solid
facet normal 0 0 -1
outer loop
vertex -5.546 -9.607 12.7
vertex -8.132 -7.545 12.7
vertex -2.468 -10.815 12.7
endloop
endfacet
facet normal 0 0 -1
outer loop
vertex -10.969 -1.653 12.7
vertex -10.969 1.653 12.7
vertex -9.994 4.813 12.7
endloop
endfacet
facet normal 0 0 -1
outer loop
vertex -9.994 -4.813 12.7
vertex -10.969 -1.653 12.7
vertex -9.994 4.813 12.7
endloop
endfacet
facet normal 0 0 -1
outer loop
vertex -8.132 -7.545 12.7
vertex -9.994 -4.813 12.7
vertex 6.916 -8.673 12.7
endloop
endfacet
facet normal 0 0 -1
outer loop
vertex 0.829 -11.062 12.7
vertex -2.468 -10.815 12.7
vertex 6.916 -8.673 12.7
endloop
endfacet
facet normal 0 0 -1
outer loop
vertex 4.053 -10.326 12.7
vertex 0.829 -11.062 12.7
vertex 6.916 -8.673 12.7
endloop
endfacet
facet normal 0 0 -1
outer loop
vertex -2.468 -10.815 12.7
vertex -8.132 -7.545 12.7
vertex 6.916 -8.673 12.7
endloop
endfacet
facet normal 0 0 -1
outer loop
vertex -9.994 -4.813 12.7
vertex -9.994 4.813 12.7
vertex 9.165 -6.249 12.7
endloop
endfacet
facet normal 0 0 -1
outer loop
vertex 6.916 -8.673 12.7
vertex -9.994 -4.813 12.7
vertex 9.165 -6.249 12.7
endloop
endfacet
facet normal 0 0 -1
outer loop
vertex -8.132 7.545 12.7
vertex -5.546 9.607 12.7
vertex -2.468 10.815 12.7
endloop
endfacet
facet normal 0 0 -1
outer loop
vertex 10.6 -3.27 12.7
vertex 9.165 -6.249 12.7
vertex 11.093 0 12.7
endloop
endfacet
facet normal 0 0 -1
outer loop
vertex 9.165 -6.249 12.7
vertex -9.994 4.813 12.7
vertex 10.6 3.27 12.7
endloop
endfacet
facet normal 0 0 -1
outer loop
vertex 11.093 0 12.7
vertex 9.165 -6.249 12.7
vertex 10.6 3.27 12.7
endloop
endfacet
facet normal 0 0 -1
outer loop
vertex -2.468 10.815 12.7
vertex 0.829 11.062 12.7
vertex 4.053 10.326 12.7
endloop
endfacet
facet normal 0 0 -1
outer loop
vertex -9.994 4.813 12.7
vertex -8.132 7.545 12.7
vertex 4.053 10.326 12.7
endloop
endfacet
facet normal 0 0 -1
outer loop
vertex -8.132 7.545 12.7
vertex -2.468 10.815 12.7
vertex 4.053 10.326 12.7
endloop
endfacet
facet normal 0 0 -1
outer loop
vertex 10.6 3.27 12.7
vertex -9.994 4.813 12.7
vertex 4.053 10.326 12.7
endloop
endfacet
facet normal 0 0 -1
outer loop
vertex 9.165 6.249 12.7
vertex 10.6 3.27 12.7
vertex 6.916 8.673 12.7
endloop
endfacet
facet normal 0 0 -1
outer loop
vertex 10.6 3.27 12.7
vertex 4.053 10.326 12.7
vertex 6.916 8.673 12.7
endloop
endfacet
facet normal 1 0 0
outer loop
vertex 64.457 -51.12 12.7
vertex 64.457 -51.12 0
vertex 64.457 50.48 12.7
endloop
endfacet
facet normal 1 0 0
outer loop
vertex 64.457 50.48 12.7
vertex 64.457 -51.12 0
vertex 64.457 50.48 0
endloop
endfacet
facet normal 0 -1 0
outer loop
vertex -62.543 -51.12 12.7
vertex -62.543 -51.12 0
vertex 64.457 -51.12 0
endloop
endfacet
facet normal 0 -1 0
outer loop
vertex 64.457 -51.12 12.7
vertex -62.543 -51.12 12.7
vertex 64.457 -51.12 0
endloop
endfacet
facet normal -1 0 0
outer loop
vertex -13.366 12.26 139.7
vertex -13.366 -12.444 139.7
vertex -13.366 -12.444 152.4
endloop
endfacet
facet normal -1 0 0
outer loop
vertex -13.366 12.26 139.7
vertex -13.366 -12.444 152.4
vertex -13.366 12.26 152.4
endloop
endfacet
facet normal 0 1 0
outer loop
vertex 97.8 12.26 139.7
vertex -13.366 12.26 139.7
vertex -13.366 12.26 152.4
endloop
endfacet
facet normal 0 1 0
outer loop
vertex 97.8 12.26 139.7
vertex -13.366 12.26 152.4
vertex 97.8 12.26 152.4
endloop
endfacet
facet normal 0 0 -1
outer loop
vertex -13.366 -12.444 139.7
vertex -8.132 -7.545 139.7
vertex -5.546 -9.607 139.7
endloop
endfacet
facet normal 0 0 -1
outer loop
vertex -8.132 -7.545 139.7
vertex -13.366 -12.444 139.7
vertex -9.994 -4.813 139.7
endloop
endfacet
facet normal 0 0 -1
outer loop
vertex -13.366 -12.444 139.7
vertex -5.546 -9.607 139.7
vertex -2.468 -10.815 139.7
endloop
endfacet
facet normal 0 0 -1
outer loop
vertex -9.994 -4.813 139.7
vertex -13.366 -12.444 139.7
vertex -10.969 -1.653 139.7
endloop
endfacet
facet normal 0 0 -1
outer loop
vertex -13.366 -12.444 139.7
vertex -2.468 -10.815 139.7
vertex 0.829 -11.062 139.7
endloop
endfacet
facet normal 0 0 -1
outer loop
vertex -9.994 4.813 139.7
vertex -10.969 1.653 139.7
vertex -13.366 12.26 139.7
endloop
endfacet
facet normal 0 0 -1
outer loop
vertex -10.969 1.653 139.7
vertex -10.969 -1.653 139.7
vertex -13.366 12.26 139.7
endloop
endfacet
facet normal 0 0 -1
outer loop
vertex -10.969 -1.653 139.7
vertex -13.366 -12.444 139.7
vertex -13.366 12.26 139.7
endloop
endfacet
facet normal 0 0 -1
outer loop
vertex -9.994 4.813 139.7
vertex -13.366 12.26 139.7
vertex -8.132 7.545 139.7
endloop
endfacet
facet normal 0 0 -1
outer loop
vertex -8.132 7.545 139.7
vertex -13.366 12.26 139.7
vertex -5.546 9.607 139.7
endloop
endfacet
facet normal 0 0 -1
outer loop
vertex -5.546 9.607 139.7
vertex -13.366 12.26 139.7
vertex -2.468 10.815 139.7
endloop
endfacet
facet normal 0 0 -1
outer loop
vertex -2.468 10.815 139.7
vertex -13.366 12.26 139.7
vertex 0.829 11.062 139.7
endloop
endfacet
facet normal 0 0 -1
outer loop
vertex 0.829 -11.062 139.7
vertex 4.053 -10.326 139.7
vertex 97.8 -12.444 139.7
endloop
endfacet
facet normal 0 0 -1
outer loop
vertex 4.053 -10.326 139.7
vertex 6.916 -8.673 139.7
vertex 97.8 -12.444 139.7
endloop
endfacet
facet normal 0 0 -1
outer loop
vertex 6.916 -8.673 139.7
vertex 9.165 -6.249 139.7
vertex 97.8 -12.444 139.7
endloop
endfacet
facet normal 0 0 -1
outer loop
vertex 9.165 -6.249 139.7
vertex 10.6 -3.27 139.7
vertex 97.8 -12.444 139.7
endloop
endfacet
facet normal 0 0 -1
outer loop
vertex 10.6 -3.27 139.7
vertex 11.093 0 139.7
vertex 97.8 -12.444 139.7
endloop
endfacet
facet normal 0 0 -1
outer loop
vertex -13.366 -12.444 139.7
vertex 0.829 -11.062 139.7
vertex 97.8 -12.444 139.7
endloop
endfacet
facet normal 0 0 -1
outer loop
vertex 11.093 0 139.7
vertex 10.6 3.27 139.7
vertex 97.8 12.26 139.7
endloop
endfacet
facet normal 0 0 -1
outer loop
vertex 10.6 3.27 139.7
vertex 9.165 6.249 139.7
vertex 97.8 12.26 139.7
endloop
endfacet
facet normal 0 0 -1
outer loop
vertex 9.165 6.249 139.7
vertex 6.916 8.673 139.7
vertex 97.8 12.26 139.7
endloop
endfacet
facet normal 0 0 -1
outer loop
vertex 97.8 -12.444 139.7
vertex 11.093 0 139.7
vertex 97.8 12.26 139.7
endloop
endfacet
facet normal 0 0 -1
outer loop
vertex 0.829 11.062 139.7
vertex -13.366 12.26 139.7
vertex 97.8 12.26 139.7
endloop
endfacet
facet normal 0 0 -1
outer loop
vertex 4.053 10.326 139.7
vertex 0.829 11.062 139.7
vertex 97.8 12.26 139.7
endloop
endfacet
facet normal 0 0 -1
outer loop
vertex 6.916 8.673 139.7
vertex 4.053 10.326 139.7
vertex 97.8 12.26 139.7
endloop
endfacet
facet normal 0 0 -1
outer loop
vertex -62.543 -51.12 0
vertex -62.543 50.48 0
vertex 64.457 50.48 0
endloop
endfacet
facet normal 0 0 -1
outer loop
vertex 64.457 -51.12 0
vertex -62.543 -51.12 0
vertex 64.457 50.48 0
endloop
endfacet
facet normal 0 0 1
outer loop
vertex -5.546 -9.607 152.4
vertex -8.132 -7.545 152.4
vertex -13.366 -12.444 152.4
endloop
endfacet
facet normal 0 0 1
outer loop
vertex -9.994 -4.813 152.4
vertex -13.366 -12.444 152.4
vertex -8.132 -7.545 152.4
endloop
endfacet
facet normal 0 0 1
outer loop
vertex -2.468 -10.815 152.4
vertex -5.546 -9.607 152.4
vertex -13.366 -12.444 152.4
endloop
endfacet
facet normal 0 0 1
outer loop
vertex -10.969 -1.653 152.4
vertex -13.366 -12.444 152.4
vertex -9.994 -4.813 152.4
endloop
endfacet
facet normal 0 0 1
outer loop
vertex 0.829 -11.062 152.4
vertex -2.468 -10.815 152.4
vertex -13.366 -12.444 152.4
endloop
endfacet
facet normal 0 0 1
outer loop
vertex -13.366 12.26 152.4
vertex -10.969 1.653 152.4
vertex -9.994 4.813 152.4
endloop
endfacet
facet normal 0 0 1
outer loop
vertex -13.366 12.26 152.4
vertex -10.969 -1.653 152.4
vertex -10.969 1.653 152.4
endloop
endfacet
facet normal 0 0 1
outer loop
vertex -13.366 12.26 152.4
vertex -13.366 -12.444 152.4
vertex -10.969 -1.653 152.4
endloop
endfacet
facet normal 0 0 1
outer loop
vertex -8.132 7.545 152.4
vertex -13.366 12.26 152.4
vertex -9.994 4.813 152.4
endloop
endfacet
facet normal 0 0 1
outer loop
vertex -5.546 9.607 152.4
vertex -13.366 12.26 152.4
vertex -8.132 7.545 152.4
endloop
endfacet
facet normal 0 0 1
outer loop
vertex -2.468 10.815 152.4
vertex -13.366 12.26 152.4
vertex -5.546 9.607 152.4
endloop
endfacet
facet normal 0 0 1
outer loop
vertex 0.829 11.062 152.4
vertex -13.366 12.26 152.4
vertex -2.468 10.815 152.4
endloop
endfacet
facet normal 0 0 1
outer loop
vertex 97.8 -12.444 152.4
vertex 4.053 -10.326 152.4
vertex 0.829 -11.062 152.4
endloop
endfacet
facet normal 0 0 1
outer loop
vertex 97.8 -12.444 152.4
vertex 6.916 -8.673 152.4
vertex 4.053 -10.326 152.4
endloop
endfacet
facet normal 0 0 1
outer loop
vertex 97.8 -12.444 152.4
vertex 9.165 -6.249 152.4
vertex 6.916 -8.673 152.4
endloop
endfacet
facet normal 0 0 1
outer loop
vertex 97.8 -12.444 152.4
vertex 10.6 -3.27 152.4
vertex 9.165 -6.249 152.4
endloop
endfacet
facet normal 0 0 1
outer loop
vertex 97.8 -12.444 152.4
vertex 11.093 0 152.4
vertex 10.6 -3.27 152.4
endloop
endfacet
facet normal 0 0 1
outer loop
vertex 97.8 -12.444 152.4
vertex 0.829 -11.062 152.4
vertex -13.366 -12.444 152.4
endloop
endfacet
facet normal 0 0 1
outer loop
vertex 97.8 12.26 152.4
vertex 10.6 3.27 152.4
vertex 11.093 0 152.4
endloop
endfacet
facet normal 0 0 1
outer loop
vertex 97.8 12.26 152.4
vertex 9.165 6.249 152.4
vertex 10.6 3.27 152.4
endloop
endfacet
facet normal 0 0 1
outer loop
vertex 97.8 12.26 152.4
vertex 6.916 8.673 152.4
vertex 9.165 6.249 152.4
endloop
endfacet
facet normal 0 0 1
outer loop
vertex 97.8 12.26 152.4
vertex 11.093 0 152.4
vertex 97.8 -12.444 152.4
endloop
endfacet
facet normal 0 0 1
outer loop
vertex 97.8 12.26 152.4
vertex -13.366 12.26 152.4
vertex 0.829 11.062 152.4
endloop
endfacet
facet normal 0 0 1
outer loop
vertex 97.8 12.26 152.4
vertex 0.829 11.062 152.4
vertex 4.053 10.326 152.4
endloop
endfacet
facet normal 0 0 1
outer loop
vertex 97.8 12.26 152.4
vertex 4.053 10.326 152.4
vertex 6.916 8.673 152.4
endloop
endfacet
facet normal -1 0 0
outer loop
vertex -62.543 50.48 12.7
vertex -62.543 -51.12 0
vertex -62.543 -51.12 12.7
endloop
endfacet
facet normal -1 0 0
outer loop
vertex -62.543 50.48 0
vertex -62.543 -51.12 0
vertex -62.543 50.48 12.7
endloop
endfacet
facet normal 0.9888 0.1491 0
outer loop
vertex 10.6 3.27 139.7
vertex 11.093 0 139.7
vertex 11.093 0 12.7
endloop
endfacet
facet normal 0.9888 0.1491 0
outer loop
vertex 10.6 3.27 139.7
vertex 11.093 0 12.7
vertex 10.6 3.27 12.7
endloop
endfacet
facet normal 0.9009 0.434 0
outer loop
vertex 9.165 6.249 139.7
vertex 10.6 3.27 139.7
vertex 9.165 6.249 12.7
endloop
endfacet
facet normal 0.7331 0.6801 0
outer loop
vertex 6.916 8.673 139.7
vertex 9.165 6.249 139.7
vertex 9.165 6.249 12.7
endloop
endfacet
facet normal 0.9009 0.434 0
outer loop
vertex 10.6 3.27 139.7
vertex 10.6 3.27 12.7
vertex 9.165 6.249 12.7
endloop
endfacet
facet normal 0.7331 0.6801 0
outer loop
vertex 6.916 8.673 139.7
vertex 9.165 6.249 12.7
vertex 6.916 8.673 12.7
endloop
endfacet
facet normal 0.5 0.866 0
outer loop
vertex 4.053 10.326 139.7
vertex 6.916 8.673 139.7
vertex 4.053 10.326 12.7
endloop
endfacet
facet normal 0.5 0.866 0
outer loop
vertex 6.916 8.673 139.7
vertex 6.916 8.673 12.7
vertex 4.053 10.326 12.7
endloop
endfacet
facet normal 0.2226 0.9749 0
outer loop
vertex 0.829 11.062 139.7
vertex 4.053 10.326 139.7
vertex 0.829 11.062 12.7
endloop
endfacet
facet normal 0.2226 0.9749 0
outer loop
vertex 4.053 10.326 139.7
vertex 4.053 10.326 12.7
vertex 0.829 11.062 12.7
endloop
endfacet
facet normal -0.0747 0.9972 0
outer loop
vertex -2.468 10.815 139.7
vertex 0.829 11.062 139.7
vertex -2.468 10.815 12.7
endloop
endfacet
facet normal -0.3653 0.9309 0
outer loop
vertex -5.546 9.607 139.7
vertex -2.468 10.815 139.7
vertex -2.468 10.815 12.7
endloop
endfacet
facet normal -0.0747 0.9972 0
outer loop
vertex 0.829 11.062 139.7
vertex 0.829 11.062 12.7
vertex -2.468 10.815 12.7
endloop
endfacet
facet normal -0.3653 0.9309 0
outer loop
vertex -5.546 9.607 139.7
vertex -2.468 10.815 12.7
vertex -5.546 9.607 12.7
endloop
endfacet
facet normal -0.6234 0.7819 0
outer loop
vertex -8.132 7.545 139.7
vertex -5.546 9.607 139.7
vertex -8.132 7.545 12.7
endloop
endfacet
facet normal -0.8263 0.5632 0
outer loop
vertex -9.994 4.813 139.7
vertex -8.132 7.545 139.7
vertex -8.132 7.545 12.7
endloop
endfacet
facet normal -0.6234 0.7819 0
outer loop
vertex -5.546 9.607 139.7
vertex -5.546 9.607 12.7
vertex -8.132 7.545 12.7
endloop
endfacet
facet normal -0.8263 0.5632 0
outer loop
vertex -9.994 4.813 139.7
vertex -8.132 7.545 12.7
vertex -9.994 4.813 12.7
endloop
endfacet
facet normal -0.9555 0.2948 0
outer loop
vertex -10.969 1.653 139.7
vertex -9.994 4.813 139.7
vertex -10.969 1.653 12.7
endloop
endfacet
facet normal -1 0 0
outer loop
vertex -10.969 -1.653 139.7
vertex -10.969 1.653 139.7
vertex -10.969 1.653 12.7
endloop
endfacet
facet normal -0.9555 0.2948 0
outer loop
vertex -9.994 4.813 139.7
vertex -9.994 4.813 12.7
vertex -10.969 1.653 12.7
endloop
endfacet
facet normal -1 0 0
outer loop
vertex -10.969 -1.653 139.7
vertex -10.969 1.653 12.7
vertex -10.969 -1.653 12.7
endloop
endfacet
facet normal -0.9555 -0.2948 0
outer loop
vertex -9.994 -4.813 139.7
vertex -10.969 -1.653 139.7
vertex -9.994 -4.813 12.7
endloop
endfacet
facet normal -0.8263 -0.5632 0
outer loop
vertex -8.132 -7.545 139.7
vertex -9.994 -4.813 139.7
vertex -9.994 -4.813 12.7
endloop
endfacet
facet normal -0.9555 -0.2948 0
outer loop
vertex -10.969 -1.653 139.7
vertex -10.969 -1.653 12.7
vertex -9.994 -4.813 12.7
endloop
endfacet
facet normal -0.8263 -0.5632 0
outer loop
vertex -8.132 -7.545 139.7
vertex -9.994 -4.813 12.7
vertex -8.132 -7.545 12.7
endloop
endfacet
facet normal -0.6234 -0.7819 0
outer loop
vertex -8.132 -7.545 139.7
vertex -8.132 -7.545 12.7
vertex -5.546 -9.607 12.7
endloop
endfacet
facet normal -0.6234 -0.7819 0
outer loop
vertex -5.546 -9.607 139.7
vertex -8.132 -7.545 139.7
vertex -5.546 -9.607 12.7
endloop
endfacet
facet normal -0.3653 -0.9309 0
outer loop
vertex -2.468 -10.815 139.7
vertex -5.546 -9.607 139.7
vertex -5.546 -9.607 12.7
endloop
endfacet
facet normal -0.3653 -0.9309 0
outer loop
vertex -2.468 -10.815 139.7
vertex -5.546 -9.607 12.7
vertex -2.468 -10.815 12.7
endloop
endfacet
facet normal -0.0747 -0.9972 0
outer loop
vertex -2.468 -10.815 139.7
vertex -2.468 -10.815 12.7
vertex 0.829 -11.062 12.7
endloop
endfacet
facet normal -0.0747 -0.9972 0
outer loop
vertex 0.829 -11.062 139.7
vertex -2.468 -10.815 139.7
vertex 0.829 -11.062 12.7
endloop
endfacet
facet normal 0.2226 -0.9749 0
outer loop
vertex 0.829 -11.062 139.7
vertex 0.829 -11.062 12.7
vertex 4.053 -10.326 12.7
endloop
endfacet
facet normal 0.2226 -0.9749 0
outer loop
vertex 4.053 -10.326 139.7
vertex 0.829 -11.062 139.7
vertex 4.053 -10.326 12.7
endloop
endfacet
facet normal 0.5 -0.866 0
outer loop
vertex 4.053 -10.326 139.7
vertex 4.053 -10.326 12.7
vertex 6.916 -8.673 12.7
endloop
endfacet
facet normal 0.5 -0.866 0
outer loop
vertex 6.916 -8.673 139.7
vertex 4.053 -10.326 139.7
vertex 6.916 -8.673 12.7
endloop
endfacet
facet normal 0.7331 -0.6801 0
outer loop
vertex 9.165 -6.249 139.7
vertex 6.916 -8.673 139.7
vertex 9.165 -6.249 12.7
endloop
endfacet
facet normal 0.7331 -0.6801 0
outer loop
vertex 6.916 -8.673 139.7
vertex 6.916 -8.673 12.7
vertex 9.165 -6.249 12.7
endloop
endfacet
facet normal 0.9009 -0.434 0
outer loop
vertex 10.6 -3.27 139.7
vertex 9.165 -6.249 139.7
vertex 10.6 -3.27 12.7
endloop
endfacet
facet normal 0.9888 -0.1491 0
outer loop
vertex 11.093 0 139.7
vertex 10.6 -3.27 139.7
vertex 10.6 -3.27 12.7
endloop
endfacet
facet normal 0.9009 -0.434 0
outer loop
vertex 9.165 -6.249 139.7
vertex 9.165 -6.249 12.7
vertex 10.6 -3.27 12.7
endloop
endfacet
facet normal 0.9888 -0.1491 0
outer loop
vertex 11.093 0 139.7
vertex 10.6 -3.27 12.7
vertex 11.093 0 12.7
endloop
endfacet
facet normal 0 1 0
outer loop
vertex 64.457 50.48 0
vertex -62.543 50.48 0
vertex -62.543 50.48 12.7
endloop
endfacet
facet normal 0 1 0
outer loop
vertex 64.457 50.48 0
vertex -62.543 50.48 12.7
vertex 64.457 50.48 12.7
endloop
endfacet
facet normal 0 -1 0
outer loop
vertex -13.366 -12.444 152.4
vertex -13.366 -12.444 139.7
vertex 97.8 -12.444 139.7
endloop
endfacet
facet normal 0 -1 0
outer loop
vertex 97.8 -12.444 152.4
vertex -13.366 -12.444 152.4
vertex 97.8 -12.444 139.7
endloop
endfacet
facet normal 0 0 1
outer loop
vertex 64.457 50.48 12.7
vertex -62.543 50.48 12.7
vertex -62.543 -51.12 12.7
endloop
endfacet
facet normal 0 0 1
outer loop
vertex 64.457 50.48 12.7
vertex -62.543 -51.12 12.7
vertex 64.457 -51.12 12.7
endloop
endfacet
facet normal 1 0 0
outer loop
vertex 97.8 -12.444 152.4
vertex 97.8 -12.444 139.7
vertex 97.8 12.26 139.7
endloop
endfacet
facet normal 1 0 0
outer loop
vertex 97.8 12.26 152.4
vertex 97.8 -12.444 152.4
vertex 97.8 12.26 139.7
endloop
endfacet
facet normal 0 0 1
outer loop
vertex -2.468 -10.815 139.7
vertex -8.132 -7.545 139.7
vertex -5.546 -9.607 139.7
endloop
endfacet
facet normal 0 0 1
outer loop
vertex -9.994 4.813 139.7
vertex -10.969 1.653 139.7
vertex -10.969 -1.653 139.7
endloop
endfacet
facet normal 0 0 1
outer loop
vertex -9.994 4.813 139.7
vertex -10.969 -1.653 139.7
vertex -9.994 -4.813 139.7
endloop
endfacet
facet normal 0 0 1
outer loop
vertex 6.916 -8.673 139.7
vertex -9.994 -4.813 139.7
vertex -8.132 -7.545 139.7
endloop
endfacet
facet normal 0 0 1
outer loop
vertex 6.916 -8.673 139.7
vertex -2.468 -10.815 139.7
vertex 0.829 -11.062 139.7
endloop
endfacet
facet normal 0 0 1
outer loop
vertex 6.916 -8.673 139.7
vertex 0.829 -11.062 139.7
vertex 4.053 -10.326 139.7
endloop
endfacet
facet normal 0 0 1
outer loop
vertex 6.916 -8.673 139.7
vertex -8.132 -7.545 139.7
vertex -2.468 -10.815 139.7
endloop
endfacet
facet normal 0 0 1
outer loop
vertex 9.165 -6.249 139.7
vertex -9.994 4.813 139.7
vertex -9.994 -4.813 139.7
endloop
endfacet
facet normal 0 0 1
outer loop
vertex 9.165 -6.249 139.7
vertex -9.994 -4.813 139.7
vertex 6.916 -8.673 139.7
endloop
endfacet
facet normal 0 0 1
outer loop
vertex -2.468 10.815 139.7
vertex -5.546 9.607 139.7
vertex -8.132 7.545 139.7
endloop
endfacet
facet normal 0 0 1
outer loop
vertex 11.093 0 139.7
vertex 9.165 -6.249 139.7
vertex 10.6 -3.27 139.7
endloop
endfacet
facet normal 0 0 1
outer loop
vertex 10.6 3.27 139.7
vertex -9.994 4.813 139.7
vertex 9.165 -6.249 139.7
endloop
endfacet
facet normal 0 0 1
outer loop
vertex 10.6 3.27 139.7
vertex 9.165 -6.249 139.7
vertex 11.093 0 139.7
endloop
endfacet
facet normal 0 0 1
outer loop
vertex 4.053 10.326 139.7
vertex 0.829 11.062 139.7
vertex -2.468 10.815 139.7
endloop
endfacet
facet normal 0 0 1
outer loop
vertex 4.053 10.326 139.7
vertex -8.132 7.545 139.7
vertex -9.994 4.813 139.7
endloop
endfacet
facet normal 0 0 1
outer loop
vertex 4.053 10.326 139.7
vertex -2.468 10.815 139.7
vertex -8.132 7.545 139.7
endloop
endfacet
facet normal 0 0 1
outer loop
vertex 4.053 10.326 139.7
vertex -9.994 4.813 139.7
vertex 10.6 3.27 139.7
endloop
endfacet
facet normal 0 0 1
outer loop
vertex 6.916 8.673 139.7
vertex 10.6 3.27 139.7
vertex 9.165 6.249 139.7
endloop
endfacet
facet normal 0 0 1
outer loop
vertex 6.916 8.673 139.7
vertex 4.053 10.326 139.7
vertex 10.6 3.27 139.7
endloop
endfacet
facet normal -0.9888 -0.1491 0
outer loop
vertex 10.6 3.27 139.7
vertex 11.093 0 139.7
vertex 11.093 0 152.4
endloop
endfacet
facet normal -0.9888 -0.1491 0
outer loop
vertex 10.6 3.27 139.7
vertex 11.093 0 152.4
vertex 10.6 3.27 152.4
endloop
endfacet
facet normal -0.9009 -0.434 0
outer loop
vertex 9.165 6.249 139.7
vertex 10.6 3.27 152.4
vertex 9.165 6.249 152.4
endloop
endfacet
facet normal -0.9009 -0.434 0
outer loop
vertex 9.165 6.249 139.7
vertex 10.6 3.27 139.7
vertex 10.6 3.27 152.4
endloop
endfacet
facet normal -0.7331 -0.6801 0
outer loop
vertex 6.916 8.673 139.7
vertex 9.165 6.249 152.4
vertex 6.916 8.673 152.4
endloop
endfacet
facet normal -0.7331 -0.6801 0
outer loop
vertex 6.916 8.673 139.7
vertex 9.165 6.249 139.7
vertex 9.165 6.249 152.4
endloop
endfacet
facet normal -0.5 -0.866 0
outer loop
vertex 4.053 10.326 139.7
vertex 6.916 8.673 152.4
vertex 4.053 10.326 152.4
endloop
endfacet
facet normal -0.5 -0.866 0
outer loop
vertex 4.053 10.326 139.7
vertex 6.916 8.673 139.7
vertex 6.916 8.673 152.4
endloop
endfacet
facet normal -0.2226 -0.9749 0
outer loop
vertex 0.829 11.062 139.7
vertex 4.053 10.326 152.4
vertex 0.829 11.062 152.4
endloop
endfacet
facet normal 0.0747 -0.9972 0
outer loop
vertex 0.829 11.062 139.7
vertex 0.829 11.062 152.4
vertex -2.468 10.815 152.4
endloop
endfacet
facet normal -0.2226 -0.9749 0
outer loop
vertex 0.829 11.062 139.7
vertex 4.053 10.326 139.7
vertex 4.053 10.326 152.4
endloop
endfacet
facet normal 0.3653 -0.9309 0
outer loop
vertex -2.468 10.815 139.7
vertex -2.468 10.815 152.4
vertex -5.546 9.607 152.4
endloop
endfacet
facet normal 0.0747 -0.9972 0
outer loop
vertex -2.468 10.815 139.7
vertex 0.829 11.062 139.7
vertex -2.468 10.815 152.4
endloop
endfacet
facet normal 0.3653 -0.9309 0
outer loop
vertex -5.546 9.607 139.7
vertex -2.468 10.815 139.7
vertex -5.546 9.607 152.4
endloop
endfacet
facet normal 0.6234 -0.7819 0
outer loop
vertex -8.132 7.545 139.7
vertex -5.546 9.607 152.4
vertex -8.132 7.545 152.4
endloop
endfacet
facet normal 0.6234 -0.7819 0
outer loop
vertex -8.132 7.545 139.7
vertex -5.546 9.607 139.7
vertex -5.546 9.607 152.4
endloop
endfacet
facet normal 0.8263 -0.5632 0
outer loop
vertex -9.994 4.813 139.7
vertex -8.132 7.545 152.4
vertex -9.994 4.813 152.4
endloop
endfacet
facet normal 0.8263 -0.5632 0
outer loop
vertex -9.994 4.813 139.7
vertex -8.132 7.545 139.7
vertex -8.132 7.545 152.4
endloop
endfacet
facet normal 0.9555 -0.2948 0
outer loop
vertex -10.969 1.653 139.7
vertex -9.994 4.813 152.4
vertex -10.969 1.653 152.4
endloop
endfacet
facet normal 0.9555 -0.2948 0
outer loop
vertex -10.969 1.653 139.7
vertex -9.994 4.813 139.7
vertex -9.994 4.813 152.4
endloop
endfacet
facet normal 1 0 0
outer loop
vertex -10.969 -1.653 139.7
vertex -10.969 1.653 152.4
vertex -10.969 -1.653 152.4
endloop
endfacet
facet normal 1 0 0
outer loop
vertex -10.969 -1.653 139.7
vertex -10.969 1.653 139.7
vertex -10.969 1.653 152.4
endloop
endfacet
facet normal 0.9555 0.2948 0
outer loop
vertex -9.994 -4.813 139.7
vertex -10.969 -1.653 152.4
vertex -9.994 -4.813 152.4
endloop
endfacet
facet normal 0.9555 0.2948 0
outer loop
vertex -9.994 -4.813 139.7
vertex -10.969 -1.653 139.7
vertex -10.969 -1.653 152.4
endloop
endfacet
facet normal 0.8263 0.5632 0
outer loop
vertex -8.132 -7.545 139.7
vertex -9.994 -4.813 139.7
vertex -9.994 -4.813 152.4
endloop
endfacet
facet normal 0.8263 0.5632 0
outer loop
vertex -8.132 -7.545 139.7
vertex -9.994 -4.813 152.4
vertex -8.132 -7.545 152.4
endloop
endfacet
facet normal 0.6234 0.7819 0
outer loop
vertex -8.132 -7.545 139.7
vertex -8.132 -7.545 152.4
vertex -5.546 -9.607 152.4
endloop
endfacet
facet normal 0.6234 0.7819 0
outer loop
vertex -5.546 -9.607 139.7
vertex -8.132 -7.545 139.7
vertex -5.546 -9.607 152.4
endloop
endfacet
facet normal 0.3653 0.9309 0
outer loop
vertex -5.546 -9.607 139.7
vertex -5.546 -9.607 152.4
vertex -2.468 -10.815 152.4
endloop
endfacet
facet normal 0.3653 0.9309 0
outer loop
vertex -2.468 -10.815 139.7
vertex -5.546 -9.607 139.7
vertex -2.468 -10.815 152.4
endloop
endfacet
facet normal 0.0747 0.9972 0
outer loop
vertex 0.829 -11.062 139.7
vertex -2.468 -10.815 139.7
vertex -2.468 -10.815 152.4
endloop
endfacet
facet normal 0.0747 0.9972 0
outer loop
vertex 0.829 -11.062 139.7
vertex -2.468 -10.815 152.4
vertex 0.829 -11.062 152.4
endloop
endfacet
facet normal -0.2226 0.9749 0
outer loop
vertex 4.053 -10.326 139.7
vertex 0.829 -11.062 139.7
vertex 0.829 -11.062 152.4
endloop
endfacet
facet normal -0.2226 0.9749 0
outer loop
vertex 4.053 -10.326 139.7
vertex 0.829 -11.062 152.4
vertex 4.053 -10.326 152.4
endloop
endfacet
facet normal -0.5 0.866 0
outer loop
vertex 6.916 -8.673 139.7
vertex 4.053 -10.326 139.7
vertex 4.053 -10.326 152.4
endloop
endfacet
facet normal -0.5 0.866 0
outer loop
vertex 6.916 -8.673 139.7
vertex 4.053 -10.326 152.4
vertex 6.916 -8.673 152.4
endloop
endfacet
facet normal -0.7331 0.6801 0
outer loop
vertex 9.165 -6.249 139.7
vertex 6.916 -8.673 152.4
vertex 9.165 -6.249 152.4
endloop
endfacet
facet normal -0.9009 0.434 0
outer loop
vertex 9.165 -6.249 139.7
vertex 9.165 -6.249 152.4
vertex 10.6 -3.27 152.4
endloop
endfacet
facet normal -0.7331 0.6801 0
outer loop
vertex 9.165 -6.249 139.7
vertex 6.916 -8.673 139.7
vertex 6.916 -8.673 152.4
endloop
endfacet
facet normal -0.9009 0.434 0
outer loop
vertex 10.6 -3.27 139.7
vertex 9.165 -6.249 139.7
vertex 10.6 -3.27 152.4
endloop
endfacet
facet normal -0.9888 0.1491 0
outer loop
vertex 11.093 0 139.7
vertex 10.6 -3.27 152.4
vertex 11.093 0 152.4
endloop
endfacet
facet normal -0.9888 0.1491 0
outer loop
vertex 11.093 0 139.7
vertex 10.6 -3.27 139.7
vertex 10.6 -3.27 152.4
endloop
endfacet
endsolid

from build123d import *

# Parameters (mm, degrees)
F0_W     = 127
F0_H     = 101.6
F1_DEPTH = 12.7
F2_R     = 11.09274
F3_DEPTH = 127
F4_W     = 111.165965
F4_H     = 24.703549
F4_R     = 11.09274
F5_DEPTH = 12.7


with BuildPart() as f1:
    # F0 (on Top) → F1 (new body)
    with BuildSketch(Plane.XY):
        with Locations((0.957116, -0.31968)):
            Rectangle(F0_W, F0_H)
    extrude(amount=F1_DEPTH)


with BuildPart() as f3:
    # F2 (on face) → F3 (new body)
    with BuildSketch(Plane.XY.offset(12.7)):
        Circle(F2_R)
    extrude(amount=F3_DEPTH)


with BuildPart() as f5:
    # F4 (on face) → F5 (new body)
    with BuildSketch(Plane.XY.offset(139.7)):
        with Locations((42.217258, -0.092178)):
            Rectangle(F4_W, F4_H)
        Circle(F4_R, mode=Mode.SUBTRACT)
    extrude(amount=F5_DEPTH)


solid = Compound([f1.part, f3.part, f5.part])
